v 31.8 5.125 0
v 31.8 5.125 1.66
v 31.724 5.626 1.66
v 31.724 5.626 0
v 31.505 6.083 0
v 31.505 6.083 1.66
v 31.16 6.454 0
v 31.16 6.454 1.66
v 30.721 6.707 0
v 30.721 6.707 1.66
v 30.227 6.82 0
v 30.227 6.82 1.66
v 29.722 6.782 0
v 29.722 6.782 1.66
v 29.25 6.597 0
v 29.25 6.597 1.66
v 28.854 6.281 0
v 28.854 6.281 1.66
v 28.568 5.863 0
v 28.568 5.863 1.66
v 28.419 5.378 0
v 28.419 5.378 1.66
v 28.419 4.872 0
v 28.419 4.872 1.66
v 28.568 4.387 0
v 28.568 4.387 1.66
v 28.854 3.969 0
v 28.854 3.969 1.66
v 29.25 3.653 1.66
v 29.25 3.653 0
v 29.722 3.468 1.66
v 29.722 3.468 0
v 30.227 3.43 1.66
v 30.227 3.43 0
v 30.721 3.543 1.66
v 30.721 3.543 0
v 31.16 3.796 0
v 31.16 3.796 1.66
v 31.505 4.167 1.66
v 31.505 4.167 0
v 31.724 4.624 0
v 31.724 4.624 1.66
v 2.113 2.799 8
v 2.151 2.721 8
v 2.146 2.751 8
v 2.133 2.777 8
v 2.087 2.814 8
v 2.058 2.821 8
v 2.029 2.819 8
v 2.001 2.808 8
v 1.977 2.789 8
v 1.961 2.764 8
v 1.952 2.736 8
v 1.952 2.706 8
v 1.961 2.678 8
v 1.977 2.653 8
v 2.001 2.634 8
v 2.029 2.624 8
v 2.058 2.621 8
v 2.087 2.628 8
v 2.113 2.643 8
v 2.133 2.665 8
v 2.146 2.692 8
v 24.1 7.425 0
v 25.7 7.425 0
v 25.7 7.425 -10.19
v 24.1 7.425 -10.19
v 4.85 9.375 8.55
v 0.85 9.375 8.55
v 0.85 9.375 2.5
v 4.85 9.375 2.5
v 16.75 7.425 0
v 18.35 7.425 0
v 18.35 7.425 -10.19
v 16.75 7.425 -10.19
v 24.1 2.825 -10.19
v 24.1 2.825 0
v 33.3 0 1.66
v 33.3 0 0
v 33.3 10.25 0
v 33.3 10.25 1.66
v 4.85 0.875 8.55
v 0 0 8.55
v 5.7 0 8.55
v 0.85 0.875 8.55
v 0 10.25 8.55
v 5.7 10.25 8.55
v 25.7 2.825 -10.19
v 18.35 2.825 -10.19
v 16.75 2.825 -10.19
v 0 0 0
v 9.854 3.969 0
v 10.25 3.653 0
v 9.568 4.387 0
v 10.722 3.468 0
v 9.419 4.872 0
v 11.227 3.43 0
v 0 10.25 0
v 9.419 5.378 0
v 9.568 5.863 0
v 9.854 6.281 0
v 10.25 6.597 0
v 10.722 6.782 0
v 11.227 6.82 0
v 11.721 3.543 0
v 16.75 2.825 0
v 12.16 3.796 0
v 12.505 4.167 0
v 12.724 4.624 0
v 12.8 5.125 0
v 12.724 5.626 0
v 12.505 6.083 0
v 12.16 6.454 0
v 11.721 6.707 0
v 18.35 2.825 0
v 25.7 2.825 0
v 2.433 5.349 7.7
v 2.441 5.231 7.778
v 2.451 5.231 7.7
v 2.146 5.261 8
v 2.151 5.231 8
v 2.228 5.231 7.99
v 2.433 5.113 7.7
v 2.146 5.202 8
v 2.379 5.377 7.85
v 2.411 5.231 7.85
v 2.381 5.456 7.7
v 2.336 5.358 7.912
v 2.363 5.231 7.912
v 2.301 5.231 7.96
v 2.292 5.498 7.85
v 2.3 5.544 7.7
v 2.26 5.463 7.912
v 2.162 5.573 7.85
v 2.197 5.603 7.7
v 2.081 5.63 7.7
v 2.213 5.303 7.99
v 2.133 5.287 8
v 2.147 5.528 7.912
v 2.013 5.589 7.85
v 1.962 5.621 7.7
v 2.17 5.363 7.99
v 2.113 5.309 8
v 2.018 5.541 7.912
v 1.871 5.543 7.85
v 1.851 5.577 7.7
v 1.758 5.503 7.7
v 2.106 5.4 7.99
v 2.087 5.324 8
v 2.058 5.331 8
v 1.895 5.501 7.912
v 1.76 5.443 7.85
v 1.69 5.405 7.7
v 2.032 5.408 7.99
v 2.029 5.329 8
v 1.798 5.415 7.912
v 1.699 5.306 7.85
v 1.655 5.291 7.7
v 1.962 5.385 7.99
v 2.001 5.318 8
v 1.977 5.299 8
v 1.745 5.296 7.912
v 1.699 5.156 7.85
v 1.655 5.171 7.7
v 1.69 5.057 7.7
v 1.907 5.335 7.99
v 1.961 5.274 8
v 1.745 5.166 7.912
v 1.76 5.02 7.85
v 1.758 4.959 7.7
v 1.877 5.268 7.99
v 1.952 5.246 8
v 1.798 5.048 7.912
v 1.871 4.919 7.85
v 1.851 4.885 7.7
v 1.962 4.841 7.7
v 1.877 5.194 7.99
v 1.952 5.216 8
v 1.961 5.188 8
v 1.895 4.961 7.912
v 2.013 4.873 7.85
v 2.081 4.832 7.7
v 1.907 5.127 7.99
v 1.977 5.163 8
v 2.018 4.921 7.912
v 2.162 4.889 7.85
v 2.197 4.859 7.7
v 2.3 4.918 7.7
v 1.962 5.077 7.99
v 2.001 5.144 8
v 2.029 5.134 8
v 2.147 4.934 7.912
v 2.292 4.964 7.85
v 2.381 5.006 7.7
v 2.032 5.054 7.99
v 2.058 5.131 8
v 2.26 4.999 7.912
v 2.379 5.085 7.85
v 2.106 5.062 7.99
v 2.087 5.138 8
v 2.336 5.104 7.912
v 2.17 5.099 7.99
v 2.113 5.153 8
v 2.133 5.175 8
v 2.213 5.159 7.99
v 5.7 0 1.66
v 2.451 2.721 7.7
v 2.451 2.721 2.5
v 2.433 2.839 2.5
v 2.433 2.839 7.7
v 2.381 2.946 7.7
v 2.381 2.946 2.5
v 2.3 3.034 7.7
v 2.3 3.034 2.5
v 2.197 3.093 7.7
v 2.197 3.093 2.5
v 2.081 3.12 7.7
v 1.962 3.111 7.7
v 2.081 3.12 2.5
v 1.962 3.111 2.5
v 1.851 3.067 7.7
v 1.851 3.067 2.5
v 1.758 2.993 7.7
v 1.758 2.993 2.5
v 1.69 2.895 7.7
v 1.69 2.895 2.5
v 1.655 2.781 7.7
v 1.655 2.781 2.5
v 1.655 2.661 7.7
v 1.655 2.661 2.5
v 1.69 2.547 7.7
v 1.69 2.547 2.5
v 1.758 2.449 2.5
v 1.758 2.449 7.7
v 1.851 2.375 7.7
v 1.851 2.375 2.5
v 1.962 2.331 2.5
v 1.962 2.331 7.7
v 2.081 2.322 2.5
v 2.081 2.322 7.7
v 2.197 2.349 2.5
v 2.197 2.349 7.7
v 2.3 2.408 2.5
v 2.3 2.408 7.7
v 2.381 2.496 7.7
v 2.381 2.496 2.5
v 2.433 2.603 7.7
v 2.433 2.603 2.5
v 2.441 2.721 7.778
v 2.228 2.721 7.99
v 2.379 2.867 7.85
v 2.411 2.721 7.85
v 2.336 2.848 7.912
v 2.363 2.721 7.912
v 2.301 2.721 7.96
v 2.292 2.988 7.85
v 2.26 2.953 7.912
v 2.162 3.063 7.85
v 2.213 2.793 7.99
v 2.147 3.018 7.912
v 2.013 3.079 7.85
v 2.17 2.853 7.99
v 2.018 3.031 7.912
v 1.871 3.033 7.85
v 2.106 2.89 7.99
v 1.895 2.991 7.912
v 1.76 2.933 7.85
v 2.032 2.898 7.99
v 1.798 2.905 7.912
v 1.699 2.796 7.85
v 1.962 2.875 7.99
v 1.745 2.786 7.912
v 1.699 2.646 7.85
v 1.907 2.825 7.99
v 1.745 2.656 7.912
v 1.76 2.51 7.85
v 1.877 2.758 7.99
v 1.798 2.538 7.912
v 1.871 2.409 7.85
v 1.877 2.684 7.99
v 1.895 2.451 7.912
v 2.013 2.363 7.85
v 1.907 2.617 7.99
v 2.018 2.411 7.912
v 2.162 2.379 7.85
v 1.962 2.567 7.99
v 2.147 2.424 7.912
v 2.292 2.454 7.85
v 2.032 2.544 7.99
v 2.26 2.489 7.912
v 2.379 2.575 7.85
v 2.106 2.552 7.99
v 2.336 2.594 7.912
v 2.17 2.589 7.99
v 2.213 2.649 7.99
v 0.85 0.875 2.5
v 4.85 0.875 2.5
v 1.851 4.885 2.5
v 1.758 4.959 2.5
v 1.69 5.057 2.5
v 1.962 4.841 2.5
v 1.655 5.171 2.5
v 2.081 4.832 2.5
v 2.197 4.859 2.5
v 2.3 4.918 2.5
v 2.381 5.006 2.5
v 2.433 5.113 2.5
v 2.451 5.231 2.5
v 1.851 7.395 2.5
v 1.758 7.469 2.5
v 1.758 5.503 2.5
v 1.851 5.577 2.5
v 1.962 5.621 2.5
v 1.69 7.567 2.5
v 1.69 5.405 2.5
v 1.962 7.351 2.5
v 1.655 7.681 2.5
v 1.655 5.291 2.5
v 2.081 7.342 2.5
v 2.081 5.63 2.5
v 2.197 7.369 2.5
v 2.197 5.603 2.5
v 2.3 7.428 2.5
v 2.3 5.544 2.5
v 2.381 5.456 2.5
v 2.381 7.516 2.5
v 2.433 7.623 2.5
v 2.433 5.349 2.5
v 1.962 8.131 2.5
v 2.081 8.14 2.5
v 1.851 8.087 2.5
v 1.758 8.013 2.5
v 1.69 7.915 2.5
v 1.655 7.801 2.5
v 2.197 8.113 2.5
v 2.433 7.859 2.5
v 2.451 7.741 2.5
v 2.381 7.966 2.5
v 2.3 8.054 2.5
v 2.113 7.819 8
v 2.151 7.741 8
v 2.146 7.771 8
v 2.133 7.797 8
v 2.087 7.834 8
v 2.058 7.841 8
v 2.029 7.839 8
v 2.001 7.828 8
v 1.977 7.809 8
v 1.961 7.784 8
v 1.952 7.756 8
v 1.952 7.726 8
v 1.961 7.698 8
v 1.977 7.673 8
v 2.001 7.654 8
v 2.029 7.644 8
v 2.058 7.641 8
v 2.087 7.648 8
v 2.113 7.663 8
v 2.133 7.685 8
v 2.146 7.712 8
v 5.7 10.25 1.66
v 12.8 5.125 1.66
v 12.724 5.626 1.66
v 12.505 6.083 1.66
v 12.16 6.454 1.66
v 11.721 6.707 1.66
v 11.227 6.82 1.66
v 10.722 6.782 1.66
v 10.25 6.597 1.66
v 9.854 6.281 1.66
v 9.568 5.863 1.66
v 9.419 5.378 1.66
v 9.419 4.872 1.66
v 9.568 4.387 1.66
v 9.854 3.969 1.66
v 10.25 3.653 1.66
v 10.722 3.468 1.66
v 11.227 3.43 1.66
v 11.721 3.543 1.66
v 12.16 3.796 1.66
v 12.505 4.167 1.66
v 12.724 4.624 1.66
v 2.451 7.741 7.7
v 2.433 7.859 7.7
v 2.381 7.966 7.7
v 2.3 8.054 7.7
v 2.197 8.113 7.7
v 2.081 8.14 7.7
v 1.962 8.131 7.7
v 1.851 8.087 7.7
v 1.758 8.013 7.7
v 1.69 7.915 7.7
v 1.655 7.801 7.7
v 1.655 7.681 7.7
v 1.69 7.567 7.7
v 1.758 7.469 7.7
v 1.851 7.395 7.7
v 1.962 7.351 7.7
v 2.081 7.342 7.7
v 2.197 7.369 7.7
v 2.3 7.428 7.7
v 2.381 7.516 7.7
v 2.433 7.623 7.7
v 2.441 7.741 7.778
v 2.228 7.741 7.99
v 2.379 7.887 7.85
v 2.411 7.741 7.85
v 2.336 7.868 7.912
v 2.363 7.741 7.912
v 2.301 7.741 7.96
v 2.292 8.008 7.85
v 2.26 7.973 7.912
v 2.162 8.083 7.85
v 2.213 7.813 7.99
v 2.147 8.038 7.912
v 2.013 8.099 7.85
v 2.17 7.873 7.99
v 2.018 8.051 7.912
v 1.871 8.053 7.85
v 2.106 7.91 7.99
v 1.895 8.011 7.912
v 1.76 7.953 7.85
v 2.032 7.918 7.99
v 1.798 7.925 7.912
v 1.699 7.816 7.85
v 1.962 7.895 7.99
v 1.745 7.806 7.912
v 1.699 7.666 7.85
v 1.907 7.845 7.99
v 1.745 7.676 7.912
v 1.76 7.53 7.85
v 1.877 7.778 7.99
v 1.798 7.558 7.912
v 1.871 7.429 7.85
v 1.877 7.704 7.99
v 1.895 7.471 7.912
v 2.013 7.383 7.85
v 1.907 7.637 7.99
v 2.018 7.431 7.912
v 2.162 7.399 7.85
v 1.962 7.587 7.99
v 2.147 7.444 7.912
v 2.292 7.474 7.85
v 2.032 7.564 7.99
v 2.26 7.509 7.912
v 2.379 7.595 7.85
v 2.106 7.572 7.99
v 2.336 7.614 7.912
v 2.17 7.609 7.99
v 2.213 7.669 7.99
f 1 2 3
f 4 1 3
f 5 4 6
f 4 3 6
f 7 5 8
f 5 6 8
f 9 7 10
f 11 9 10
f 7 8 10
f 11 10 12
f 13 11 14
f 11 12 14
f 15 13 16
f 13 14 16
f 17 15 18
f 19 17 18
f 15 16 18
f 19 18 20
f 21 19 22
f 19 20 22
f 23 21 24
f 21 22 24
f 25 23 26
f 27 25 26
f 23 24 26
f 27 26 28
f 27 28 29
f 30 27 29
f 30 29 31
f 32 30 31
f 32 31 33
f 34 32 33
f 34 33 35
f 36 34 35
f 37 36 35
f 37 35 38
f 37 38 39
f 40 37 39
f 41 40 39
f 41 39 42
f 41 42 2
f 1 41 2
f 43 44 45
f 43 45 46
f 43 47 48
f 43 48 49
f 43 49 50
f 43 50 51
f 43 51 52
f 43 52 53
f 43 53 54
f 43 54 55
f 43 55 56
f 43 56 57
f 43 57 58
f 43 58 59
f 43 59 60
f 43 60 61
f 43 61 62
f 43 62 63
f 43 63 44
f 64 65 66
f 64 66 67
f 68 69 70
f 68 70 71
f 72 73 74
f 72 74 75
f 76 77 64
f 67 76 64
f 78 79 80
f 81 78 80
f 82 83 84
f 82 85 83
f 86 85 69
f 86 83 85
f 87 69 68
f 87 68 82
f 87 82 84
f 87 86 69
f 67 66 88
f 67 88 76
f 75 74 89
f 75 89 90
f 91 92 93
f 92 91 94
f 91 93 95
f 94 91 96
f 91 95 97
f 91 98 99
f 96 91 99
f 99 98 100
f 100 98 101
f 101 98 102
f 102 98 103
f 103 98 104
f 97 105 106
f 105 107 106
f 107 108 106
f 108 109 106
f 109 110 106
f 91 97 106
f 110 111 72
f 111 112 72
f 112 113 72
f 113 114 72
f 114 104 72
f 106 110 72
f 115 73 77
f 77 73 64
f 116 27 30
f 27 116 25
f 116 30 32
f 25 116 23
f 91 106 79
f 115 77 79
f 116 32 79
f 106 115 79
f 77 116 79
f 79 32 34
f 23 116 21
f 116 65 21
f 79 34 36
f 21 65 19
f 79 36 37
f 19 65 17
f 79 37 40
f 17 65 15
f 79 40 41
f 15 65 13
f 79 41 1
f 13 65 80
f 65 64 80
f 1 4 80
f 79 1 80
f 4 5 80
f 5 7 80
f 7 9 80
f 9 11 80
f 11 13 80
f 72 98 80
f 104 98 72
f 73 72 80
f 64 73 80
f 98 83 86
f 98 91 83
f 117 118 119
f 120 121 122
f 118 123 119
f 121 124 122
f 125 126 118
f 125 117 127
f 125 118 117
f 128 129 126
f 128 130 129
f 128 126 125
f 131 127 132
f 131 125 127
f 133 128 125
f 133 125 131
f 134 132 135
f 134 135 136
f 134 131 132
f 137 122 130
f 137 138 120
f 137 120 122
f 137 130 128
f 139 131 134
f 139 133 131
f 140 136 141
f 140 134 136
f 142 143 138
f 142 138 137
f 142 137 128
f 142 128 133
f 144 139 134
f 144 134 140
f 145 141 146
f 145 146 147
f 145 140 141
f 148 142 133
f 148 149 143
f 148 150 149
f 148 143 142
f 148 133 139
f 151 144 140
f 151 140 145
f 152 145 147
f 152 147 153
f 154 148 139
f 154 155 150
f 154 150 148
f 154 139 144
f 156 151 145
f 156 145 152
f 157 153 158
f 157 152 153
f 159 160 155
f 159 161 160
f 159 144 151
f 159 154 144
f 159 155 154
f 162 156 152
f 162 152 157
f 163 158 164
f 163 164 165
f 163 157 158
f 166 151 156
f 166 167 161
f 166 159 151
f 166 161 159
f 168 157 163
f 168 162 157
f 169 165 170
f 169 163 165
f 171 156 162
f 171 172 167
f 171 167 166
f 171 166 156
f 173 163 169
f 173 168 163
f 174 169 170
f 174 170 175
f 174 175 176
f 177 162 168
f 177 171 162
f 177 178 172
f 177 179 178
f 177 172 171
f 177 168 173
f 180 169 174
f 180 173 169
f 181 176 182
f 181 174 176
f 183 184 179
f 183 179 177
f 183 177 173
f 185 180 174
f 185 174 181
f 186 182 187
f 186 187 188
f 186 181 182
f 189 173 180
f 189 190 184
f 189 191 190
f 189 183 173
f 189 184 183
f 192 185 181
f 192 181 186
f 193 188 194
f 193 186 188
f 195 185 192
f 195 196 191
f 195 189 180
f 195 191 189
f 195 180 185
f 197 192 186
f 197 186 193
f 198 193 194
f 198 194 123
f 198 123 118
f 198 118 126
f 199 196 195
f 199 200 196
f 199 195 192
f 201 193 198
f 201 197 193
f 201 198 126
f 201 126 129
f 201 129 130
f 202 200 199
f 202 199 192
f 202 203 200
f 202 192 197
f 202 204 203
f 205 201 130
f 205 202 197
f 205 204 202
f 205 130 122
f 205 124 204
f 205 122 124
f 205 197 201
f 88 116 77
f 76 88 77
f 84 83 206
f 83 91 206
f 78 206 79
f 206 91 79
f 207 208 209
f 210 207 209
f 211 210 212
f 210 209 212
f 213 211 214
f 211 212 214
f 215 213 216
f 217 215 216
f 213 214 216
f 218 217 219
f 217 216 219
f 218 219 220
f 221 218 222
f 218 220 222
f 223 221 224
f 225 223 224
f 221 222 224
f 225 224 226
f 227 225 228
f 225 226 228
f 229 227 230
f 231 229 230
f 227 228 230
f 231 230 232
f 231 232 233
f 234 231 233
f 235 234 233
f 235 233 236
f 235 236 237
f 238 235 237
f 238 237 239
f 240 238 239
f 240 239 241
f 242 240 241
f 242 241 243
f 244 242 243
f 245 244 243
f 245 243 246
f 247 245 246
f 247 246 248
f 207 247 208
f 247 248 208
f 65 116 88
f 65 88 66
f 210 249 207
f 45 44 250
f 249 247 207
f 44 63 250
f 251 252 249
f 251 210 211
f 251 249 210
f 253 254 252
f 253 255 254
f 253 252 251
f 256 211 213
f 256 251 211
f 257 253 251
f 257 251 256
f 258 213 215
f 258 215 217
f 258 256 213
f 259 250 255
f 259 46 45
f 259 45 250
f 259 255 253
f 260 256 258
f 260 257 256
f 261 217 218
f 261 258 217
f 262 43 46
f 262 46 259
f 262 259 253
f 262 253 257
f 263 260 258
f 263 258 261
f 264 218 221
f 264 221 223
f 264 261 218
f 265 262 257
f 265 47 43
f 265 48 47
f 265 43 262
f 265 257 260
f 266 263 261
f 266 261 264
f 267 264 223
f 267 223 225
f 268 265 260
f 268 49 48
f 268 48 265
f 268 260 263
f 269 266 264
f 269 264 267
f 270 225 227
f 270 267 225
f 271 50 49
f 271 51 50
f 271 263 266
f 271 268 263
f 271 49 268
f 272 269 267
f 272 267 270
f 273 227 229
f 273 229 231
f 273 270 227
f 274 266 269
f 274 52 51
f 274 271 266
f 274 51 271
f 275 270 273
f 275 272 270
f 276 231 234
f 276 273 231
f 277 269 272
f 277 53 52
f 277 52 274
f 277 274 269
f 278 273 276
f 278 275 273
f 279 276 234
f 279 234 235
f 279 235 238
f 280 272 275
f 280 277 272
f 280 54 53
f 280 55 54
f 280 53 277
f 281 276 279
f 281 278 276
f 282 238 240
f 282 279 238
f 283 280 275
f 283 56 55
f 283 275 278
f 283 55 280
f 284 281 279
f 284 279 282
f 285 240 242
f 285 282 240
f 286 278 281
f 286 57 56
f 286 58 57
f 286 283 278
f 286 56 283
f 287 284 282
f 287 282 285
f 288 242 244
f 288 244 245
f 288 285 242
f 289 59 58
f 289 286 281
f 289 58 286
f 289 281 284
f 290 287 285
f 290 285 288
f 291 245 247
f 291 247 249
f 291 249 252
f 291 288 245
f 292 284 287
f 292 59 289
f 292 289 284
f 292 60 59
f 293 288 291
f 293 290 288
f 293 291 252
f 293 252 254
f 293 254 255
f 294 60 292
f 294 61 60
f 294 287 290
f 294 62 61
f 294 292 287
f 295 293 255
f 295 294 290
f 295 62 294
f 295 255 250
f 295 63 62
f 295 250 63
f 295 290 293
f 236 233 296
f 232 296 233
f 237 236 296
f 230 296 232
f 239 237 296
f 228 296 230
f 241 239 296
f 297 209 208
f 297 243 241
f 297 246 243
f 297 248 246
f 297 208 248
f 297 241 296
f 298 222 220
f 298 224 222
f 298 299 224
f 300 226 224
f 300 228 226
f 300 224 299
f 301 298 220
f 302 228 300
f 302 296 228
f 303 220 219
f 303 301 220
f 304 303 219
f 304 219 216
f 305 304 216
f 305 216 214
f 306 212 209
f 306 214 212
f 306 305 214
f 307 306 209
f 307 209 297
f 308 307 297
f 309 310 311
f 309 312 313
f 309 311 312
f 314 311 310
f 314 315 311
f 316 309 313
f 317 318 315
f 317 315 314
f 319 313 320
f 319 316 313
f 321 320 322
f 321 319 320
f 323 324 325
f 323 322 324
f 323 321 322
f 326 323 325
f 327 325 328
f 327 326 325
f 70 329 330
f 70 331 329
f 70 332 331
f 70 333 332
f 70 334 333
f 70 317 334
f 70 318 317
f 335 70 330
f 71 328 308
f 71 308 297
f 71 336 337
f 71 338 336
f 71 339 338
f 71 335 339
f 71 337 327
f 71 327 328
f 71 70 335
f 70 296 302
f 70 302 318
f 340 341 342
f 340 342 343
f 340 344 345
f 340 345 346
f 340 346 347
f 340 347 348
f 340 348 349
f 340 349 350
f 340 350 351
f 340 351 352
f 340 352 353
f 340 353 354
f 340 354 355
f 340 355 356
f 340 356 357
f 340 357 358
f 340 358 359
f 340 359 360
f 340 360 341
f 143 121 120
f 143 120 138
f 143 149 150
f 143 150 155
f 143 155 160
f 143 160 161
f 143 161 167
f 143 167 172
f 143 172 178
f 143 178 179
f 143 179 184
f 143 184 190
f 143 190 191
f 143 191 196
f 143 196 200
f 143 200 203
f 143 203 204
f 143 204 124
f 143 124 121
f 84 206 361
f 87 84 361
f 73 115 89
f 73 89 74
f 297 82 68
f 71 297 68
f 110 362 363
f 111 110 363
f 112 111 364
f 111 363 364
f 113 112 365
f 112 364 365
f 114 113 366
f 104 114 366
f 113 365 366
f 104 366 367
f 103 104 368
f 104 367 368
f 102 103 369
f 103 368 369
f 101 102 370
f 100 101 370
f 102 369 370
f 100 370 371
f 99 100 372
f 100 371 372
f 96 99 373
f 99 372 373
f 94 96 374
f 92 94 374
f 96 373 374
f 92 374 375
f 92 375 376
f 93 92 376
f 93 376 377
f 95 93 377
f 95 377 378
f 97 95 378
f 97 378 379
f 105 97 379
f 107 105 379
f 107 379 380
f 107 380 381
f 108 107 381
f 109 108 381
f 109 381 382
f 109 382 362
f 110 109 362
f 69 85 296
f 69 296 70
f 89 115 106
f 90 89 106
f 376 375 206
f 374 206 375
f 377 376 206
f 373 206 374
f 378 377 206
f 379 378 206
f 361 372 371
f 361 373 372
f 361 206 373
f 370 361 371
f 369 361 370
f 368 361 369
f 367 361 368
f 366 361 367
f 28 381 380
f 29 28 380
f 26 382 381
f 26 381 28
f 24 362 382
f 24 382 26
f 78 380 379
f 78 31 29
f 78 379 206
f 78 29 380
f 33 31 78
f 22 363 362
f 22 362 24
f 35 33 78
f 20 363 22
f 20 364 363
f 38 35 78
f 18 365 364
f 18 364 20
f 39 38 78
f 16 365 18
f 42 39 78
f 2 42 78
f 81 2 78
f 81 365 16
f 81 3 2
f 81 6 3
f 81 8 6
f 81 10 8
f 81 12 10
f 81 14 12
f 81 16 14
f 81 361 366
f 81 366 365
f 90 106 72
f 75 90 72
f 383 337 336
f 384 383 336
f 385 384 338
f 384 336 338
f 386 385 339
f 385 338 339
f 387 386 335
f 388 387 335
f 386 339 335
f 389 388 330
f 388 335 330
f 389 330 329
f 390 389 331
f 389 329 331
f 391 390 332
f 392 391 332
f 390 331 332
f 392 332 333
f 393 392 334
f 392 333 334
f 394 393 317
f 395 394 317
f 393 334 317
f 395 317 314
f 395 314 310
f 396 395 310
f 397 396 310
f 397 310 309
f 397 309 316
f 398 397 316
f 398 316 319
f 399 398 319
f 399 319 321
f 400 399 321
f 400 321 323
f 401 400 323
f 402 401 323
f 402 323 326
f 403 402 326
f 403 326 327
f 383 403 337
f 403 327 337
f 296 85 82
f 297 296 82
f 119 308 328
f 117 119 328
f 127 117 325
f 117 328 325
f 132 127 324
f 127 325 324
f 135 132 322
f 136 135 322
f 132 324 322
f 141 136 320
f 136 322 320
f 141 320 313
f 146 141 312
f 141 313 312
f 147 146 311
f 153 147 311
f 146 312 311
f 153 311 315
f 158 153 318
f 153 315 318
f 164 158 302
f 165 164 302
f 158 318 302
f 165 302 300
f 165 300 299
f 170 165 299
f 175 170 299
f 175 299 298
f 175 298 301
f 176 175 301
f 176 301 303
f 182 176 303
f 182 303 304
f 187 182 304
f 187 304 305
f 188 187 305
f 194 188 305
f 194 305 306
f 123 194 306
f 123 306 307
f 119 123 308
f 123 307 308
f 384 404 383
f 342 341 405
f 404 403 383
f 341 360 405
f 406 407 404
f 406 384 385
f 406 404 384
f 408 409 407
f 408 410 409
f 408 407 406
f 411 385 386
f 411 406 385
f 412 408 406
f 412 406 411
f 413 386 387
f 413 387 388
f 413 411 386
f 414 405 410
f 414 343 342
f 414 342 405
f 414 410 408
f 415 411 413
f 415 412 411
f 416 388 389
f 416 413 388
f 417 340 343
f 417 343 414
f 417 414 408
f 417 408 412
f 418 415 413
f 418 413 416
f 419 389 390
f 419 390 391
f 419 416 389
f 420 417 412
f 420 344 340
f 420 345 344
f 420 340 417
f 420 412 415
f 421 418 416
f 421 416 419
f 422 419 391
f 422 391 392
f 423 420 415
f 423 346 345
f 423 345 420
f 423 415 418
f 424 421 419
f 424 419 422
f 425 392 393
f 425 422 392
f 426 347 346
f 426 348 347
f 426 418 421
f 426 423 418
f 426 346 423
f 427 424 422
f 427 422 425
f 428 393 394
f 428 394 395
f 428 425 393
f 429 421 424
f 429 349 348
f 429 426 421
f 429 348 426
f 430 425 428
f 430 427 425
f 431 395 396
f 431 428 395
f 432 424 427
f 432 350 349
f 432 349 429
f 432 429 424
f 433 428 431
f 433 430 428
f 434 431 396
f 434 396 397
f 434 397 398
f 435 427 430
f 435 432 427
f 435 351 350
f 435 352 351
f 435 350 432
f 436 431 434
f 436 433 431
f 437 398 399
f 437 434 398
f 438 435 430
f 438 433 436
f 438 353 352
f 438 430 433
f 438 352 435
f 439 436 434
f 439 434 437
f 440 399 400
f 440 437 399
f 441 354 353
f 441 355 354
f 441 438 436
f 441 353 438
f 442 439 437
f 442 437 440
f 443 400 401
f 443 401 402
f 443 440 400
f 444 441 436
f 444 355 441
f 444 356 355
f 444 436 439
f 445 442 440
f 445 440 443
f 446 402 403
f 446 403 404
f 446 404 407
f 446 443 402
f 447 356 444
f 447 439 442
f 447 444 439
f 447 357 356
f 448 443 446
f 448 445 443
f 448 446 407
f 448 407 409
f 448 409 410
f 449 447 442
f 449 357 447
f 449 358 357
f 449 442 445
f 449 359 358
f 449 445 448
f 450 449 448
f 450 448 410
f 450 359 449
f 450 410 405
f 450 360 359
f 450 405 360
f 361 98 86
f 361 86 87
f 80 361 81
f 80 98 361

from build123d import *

# Parameters (mm, degrees)
SKETCH_1_W          = 33.3
SKETCH_1_H          = 10.25
EXTRUDE_1_DEPTH     = 1.66
SKETCH_2_W          = 5.7
SKETCH_2_H          = 10.25
EXTRUDE_3_DEPTH     = 6.89
SKETCH_3_W          = 4
SKETCH_3_H          = 8.5
CUT_EXTRUDE_1_DEPTH = 6.05
SKETCH_4_R          = 0.4
EXTRUDE_4_DEPTH     = 5.5
FILLET_1_R          = 0.3
SKETCH_5_R          = 1.7
CUT_EXTRUDE_2_DEPTH = 36.516539809
SKETCH_6_W          = 1.6
SKETCH_6_H          = 4.6
EXTRUDE_5_DEPTH     = 10.19


with BuildPart() as part:
    # Эскиз1 → Бобышка-Вытянуть1 (new body)
    with BuildSketch(Plane.XY):
        with Locations((16.65, 5.125)):
            Rectangle(SKETCH_1_W, SKETCH_1_H)
    extrude(amount=EXTRUDE_1_DEPTH)

    # Эскиз2 → Бобышка-Вытянуть3 (add)
    with BuildSketch(Plane.XY.offset(1.66)):
        with Locations((2.85, 5.125)):
            Rectangle(SKETCH_2_W, SKETCH_2_H)
    extrude(amount=EXTRUDE_3_DEPTH)

    # Эскиз3 → Вырез-Вытянуть1 (cut)
    with BuildSketch(Plane.XY.offset(8.55)):
        with Locations((2.85, 5.125)):
            Rectangle(SKETCH_3_W, SKETCH_3_H)
    extrude(amount=-CUT_EXTRUDE_1_DEPTH, mode=Mode.SUBTRACT)

    # Эскиз4 → Бобышка-Вытянуть4 (add)
    with BuildSketch(Plane.XY.offset(2.5)):
        with Locations((2.050760191, 5.231038637)):
            Circle(SKETCH_4_R)
        with Locations((2.050760191, 7.741038637)):
            Circle(SKETCH_4_R)
        with Locations((2.050760191, 2.721038637)):
            Circle(SKETCH_4_R)
    extrude(amount=EXTRUDE_4_DEPTH)

    # Скругление1
    fillet_1_edges = [part.edges().sort_by_distance(p)[0] for p in [
        (1.650760191, 5.231038637, 8),
        (1.650760191, 7.741038637, 8),
        (1.650760191, 2.721038637, 8),
    ]]
    fillet(fillet_1_edges, radius=FILLET_1_R)

    # Эскиз5 → Вырез-Вытянуть2 (cut, through all)
    with BuildSketch(Plane.XY.offset(1.66)):
        with Locations((11.1, 5.125)):
            Circle(SKETCH_5_R)
        with Locations((30.1, 5.125)):
            Circle(SKETCH_5_R)
    extrude(amount=-CUT_EXTRUDE_2_DEPTH, mode=Mode.SUBTRACT)

    # Эскиз6 → Бобышка-Вытянуть5 (add)
    with BuildSketch(Plane(origin=(0, 0, 0), x_dir=(-1, 0, 0), z_dir=(0, 0, -1))):
        with Locations((-24.9, 5.125)):
            Rectangle(SKETCH_6_W, SKETCH_6_H)
        with Locations((-17.55, 5.125)):
            Rectangle(SKETCH_6_W, SKETCH_6_H)
    extrude(amount=EXTRUDE_5_DEPTH)


solid = part.part
